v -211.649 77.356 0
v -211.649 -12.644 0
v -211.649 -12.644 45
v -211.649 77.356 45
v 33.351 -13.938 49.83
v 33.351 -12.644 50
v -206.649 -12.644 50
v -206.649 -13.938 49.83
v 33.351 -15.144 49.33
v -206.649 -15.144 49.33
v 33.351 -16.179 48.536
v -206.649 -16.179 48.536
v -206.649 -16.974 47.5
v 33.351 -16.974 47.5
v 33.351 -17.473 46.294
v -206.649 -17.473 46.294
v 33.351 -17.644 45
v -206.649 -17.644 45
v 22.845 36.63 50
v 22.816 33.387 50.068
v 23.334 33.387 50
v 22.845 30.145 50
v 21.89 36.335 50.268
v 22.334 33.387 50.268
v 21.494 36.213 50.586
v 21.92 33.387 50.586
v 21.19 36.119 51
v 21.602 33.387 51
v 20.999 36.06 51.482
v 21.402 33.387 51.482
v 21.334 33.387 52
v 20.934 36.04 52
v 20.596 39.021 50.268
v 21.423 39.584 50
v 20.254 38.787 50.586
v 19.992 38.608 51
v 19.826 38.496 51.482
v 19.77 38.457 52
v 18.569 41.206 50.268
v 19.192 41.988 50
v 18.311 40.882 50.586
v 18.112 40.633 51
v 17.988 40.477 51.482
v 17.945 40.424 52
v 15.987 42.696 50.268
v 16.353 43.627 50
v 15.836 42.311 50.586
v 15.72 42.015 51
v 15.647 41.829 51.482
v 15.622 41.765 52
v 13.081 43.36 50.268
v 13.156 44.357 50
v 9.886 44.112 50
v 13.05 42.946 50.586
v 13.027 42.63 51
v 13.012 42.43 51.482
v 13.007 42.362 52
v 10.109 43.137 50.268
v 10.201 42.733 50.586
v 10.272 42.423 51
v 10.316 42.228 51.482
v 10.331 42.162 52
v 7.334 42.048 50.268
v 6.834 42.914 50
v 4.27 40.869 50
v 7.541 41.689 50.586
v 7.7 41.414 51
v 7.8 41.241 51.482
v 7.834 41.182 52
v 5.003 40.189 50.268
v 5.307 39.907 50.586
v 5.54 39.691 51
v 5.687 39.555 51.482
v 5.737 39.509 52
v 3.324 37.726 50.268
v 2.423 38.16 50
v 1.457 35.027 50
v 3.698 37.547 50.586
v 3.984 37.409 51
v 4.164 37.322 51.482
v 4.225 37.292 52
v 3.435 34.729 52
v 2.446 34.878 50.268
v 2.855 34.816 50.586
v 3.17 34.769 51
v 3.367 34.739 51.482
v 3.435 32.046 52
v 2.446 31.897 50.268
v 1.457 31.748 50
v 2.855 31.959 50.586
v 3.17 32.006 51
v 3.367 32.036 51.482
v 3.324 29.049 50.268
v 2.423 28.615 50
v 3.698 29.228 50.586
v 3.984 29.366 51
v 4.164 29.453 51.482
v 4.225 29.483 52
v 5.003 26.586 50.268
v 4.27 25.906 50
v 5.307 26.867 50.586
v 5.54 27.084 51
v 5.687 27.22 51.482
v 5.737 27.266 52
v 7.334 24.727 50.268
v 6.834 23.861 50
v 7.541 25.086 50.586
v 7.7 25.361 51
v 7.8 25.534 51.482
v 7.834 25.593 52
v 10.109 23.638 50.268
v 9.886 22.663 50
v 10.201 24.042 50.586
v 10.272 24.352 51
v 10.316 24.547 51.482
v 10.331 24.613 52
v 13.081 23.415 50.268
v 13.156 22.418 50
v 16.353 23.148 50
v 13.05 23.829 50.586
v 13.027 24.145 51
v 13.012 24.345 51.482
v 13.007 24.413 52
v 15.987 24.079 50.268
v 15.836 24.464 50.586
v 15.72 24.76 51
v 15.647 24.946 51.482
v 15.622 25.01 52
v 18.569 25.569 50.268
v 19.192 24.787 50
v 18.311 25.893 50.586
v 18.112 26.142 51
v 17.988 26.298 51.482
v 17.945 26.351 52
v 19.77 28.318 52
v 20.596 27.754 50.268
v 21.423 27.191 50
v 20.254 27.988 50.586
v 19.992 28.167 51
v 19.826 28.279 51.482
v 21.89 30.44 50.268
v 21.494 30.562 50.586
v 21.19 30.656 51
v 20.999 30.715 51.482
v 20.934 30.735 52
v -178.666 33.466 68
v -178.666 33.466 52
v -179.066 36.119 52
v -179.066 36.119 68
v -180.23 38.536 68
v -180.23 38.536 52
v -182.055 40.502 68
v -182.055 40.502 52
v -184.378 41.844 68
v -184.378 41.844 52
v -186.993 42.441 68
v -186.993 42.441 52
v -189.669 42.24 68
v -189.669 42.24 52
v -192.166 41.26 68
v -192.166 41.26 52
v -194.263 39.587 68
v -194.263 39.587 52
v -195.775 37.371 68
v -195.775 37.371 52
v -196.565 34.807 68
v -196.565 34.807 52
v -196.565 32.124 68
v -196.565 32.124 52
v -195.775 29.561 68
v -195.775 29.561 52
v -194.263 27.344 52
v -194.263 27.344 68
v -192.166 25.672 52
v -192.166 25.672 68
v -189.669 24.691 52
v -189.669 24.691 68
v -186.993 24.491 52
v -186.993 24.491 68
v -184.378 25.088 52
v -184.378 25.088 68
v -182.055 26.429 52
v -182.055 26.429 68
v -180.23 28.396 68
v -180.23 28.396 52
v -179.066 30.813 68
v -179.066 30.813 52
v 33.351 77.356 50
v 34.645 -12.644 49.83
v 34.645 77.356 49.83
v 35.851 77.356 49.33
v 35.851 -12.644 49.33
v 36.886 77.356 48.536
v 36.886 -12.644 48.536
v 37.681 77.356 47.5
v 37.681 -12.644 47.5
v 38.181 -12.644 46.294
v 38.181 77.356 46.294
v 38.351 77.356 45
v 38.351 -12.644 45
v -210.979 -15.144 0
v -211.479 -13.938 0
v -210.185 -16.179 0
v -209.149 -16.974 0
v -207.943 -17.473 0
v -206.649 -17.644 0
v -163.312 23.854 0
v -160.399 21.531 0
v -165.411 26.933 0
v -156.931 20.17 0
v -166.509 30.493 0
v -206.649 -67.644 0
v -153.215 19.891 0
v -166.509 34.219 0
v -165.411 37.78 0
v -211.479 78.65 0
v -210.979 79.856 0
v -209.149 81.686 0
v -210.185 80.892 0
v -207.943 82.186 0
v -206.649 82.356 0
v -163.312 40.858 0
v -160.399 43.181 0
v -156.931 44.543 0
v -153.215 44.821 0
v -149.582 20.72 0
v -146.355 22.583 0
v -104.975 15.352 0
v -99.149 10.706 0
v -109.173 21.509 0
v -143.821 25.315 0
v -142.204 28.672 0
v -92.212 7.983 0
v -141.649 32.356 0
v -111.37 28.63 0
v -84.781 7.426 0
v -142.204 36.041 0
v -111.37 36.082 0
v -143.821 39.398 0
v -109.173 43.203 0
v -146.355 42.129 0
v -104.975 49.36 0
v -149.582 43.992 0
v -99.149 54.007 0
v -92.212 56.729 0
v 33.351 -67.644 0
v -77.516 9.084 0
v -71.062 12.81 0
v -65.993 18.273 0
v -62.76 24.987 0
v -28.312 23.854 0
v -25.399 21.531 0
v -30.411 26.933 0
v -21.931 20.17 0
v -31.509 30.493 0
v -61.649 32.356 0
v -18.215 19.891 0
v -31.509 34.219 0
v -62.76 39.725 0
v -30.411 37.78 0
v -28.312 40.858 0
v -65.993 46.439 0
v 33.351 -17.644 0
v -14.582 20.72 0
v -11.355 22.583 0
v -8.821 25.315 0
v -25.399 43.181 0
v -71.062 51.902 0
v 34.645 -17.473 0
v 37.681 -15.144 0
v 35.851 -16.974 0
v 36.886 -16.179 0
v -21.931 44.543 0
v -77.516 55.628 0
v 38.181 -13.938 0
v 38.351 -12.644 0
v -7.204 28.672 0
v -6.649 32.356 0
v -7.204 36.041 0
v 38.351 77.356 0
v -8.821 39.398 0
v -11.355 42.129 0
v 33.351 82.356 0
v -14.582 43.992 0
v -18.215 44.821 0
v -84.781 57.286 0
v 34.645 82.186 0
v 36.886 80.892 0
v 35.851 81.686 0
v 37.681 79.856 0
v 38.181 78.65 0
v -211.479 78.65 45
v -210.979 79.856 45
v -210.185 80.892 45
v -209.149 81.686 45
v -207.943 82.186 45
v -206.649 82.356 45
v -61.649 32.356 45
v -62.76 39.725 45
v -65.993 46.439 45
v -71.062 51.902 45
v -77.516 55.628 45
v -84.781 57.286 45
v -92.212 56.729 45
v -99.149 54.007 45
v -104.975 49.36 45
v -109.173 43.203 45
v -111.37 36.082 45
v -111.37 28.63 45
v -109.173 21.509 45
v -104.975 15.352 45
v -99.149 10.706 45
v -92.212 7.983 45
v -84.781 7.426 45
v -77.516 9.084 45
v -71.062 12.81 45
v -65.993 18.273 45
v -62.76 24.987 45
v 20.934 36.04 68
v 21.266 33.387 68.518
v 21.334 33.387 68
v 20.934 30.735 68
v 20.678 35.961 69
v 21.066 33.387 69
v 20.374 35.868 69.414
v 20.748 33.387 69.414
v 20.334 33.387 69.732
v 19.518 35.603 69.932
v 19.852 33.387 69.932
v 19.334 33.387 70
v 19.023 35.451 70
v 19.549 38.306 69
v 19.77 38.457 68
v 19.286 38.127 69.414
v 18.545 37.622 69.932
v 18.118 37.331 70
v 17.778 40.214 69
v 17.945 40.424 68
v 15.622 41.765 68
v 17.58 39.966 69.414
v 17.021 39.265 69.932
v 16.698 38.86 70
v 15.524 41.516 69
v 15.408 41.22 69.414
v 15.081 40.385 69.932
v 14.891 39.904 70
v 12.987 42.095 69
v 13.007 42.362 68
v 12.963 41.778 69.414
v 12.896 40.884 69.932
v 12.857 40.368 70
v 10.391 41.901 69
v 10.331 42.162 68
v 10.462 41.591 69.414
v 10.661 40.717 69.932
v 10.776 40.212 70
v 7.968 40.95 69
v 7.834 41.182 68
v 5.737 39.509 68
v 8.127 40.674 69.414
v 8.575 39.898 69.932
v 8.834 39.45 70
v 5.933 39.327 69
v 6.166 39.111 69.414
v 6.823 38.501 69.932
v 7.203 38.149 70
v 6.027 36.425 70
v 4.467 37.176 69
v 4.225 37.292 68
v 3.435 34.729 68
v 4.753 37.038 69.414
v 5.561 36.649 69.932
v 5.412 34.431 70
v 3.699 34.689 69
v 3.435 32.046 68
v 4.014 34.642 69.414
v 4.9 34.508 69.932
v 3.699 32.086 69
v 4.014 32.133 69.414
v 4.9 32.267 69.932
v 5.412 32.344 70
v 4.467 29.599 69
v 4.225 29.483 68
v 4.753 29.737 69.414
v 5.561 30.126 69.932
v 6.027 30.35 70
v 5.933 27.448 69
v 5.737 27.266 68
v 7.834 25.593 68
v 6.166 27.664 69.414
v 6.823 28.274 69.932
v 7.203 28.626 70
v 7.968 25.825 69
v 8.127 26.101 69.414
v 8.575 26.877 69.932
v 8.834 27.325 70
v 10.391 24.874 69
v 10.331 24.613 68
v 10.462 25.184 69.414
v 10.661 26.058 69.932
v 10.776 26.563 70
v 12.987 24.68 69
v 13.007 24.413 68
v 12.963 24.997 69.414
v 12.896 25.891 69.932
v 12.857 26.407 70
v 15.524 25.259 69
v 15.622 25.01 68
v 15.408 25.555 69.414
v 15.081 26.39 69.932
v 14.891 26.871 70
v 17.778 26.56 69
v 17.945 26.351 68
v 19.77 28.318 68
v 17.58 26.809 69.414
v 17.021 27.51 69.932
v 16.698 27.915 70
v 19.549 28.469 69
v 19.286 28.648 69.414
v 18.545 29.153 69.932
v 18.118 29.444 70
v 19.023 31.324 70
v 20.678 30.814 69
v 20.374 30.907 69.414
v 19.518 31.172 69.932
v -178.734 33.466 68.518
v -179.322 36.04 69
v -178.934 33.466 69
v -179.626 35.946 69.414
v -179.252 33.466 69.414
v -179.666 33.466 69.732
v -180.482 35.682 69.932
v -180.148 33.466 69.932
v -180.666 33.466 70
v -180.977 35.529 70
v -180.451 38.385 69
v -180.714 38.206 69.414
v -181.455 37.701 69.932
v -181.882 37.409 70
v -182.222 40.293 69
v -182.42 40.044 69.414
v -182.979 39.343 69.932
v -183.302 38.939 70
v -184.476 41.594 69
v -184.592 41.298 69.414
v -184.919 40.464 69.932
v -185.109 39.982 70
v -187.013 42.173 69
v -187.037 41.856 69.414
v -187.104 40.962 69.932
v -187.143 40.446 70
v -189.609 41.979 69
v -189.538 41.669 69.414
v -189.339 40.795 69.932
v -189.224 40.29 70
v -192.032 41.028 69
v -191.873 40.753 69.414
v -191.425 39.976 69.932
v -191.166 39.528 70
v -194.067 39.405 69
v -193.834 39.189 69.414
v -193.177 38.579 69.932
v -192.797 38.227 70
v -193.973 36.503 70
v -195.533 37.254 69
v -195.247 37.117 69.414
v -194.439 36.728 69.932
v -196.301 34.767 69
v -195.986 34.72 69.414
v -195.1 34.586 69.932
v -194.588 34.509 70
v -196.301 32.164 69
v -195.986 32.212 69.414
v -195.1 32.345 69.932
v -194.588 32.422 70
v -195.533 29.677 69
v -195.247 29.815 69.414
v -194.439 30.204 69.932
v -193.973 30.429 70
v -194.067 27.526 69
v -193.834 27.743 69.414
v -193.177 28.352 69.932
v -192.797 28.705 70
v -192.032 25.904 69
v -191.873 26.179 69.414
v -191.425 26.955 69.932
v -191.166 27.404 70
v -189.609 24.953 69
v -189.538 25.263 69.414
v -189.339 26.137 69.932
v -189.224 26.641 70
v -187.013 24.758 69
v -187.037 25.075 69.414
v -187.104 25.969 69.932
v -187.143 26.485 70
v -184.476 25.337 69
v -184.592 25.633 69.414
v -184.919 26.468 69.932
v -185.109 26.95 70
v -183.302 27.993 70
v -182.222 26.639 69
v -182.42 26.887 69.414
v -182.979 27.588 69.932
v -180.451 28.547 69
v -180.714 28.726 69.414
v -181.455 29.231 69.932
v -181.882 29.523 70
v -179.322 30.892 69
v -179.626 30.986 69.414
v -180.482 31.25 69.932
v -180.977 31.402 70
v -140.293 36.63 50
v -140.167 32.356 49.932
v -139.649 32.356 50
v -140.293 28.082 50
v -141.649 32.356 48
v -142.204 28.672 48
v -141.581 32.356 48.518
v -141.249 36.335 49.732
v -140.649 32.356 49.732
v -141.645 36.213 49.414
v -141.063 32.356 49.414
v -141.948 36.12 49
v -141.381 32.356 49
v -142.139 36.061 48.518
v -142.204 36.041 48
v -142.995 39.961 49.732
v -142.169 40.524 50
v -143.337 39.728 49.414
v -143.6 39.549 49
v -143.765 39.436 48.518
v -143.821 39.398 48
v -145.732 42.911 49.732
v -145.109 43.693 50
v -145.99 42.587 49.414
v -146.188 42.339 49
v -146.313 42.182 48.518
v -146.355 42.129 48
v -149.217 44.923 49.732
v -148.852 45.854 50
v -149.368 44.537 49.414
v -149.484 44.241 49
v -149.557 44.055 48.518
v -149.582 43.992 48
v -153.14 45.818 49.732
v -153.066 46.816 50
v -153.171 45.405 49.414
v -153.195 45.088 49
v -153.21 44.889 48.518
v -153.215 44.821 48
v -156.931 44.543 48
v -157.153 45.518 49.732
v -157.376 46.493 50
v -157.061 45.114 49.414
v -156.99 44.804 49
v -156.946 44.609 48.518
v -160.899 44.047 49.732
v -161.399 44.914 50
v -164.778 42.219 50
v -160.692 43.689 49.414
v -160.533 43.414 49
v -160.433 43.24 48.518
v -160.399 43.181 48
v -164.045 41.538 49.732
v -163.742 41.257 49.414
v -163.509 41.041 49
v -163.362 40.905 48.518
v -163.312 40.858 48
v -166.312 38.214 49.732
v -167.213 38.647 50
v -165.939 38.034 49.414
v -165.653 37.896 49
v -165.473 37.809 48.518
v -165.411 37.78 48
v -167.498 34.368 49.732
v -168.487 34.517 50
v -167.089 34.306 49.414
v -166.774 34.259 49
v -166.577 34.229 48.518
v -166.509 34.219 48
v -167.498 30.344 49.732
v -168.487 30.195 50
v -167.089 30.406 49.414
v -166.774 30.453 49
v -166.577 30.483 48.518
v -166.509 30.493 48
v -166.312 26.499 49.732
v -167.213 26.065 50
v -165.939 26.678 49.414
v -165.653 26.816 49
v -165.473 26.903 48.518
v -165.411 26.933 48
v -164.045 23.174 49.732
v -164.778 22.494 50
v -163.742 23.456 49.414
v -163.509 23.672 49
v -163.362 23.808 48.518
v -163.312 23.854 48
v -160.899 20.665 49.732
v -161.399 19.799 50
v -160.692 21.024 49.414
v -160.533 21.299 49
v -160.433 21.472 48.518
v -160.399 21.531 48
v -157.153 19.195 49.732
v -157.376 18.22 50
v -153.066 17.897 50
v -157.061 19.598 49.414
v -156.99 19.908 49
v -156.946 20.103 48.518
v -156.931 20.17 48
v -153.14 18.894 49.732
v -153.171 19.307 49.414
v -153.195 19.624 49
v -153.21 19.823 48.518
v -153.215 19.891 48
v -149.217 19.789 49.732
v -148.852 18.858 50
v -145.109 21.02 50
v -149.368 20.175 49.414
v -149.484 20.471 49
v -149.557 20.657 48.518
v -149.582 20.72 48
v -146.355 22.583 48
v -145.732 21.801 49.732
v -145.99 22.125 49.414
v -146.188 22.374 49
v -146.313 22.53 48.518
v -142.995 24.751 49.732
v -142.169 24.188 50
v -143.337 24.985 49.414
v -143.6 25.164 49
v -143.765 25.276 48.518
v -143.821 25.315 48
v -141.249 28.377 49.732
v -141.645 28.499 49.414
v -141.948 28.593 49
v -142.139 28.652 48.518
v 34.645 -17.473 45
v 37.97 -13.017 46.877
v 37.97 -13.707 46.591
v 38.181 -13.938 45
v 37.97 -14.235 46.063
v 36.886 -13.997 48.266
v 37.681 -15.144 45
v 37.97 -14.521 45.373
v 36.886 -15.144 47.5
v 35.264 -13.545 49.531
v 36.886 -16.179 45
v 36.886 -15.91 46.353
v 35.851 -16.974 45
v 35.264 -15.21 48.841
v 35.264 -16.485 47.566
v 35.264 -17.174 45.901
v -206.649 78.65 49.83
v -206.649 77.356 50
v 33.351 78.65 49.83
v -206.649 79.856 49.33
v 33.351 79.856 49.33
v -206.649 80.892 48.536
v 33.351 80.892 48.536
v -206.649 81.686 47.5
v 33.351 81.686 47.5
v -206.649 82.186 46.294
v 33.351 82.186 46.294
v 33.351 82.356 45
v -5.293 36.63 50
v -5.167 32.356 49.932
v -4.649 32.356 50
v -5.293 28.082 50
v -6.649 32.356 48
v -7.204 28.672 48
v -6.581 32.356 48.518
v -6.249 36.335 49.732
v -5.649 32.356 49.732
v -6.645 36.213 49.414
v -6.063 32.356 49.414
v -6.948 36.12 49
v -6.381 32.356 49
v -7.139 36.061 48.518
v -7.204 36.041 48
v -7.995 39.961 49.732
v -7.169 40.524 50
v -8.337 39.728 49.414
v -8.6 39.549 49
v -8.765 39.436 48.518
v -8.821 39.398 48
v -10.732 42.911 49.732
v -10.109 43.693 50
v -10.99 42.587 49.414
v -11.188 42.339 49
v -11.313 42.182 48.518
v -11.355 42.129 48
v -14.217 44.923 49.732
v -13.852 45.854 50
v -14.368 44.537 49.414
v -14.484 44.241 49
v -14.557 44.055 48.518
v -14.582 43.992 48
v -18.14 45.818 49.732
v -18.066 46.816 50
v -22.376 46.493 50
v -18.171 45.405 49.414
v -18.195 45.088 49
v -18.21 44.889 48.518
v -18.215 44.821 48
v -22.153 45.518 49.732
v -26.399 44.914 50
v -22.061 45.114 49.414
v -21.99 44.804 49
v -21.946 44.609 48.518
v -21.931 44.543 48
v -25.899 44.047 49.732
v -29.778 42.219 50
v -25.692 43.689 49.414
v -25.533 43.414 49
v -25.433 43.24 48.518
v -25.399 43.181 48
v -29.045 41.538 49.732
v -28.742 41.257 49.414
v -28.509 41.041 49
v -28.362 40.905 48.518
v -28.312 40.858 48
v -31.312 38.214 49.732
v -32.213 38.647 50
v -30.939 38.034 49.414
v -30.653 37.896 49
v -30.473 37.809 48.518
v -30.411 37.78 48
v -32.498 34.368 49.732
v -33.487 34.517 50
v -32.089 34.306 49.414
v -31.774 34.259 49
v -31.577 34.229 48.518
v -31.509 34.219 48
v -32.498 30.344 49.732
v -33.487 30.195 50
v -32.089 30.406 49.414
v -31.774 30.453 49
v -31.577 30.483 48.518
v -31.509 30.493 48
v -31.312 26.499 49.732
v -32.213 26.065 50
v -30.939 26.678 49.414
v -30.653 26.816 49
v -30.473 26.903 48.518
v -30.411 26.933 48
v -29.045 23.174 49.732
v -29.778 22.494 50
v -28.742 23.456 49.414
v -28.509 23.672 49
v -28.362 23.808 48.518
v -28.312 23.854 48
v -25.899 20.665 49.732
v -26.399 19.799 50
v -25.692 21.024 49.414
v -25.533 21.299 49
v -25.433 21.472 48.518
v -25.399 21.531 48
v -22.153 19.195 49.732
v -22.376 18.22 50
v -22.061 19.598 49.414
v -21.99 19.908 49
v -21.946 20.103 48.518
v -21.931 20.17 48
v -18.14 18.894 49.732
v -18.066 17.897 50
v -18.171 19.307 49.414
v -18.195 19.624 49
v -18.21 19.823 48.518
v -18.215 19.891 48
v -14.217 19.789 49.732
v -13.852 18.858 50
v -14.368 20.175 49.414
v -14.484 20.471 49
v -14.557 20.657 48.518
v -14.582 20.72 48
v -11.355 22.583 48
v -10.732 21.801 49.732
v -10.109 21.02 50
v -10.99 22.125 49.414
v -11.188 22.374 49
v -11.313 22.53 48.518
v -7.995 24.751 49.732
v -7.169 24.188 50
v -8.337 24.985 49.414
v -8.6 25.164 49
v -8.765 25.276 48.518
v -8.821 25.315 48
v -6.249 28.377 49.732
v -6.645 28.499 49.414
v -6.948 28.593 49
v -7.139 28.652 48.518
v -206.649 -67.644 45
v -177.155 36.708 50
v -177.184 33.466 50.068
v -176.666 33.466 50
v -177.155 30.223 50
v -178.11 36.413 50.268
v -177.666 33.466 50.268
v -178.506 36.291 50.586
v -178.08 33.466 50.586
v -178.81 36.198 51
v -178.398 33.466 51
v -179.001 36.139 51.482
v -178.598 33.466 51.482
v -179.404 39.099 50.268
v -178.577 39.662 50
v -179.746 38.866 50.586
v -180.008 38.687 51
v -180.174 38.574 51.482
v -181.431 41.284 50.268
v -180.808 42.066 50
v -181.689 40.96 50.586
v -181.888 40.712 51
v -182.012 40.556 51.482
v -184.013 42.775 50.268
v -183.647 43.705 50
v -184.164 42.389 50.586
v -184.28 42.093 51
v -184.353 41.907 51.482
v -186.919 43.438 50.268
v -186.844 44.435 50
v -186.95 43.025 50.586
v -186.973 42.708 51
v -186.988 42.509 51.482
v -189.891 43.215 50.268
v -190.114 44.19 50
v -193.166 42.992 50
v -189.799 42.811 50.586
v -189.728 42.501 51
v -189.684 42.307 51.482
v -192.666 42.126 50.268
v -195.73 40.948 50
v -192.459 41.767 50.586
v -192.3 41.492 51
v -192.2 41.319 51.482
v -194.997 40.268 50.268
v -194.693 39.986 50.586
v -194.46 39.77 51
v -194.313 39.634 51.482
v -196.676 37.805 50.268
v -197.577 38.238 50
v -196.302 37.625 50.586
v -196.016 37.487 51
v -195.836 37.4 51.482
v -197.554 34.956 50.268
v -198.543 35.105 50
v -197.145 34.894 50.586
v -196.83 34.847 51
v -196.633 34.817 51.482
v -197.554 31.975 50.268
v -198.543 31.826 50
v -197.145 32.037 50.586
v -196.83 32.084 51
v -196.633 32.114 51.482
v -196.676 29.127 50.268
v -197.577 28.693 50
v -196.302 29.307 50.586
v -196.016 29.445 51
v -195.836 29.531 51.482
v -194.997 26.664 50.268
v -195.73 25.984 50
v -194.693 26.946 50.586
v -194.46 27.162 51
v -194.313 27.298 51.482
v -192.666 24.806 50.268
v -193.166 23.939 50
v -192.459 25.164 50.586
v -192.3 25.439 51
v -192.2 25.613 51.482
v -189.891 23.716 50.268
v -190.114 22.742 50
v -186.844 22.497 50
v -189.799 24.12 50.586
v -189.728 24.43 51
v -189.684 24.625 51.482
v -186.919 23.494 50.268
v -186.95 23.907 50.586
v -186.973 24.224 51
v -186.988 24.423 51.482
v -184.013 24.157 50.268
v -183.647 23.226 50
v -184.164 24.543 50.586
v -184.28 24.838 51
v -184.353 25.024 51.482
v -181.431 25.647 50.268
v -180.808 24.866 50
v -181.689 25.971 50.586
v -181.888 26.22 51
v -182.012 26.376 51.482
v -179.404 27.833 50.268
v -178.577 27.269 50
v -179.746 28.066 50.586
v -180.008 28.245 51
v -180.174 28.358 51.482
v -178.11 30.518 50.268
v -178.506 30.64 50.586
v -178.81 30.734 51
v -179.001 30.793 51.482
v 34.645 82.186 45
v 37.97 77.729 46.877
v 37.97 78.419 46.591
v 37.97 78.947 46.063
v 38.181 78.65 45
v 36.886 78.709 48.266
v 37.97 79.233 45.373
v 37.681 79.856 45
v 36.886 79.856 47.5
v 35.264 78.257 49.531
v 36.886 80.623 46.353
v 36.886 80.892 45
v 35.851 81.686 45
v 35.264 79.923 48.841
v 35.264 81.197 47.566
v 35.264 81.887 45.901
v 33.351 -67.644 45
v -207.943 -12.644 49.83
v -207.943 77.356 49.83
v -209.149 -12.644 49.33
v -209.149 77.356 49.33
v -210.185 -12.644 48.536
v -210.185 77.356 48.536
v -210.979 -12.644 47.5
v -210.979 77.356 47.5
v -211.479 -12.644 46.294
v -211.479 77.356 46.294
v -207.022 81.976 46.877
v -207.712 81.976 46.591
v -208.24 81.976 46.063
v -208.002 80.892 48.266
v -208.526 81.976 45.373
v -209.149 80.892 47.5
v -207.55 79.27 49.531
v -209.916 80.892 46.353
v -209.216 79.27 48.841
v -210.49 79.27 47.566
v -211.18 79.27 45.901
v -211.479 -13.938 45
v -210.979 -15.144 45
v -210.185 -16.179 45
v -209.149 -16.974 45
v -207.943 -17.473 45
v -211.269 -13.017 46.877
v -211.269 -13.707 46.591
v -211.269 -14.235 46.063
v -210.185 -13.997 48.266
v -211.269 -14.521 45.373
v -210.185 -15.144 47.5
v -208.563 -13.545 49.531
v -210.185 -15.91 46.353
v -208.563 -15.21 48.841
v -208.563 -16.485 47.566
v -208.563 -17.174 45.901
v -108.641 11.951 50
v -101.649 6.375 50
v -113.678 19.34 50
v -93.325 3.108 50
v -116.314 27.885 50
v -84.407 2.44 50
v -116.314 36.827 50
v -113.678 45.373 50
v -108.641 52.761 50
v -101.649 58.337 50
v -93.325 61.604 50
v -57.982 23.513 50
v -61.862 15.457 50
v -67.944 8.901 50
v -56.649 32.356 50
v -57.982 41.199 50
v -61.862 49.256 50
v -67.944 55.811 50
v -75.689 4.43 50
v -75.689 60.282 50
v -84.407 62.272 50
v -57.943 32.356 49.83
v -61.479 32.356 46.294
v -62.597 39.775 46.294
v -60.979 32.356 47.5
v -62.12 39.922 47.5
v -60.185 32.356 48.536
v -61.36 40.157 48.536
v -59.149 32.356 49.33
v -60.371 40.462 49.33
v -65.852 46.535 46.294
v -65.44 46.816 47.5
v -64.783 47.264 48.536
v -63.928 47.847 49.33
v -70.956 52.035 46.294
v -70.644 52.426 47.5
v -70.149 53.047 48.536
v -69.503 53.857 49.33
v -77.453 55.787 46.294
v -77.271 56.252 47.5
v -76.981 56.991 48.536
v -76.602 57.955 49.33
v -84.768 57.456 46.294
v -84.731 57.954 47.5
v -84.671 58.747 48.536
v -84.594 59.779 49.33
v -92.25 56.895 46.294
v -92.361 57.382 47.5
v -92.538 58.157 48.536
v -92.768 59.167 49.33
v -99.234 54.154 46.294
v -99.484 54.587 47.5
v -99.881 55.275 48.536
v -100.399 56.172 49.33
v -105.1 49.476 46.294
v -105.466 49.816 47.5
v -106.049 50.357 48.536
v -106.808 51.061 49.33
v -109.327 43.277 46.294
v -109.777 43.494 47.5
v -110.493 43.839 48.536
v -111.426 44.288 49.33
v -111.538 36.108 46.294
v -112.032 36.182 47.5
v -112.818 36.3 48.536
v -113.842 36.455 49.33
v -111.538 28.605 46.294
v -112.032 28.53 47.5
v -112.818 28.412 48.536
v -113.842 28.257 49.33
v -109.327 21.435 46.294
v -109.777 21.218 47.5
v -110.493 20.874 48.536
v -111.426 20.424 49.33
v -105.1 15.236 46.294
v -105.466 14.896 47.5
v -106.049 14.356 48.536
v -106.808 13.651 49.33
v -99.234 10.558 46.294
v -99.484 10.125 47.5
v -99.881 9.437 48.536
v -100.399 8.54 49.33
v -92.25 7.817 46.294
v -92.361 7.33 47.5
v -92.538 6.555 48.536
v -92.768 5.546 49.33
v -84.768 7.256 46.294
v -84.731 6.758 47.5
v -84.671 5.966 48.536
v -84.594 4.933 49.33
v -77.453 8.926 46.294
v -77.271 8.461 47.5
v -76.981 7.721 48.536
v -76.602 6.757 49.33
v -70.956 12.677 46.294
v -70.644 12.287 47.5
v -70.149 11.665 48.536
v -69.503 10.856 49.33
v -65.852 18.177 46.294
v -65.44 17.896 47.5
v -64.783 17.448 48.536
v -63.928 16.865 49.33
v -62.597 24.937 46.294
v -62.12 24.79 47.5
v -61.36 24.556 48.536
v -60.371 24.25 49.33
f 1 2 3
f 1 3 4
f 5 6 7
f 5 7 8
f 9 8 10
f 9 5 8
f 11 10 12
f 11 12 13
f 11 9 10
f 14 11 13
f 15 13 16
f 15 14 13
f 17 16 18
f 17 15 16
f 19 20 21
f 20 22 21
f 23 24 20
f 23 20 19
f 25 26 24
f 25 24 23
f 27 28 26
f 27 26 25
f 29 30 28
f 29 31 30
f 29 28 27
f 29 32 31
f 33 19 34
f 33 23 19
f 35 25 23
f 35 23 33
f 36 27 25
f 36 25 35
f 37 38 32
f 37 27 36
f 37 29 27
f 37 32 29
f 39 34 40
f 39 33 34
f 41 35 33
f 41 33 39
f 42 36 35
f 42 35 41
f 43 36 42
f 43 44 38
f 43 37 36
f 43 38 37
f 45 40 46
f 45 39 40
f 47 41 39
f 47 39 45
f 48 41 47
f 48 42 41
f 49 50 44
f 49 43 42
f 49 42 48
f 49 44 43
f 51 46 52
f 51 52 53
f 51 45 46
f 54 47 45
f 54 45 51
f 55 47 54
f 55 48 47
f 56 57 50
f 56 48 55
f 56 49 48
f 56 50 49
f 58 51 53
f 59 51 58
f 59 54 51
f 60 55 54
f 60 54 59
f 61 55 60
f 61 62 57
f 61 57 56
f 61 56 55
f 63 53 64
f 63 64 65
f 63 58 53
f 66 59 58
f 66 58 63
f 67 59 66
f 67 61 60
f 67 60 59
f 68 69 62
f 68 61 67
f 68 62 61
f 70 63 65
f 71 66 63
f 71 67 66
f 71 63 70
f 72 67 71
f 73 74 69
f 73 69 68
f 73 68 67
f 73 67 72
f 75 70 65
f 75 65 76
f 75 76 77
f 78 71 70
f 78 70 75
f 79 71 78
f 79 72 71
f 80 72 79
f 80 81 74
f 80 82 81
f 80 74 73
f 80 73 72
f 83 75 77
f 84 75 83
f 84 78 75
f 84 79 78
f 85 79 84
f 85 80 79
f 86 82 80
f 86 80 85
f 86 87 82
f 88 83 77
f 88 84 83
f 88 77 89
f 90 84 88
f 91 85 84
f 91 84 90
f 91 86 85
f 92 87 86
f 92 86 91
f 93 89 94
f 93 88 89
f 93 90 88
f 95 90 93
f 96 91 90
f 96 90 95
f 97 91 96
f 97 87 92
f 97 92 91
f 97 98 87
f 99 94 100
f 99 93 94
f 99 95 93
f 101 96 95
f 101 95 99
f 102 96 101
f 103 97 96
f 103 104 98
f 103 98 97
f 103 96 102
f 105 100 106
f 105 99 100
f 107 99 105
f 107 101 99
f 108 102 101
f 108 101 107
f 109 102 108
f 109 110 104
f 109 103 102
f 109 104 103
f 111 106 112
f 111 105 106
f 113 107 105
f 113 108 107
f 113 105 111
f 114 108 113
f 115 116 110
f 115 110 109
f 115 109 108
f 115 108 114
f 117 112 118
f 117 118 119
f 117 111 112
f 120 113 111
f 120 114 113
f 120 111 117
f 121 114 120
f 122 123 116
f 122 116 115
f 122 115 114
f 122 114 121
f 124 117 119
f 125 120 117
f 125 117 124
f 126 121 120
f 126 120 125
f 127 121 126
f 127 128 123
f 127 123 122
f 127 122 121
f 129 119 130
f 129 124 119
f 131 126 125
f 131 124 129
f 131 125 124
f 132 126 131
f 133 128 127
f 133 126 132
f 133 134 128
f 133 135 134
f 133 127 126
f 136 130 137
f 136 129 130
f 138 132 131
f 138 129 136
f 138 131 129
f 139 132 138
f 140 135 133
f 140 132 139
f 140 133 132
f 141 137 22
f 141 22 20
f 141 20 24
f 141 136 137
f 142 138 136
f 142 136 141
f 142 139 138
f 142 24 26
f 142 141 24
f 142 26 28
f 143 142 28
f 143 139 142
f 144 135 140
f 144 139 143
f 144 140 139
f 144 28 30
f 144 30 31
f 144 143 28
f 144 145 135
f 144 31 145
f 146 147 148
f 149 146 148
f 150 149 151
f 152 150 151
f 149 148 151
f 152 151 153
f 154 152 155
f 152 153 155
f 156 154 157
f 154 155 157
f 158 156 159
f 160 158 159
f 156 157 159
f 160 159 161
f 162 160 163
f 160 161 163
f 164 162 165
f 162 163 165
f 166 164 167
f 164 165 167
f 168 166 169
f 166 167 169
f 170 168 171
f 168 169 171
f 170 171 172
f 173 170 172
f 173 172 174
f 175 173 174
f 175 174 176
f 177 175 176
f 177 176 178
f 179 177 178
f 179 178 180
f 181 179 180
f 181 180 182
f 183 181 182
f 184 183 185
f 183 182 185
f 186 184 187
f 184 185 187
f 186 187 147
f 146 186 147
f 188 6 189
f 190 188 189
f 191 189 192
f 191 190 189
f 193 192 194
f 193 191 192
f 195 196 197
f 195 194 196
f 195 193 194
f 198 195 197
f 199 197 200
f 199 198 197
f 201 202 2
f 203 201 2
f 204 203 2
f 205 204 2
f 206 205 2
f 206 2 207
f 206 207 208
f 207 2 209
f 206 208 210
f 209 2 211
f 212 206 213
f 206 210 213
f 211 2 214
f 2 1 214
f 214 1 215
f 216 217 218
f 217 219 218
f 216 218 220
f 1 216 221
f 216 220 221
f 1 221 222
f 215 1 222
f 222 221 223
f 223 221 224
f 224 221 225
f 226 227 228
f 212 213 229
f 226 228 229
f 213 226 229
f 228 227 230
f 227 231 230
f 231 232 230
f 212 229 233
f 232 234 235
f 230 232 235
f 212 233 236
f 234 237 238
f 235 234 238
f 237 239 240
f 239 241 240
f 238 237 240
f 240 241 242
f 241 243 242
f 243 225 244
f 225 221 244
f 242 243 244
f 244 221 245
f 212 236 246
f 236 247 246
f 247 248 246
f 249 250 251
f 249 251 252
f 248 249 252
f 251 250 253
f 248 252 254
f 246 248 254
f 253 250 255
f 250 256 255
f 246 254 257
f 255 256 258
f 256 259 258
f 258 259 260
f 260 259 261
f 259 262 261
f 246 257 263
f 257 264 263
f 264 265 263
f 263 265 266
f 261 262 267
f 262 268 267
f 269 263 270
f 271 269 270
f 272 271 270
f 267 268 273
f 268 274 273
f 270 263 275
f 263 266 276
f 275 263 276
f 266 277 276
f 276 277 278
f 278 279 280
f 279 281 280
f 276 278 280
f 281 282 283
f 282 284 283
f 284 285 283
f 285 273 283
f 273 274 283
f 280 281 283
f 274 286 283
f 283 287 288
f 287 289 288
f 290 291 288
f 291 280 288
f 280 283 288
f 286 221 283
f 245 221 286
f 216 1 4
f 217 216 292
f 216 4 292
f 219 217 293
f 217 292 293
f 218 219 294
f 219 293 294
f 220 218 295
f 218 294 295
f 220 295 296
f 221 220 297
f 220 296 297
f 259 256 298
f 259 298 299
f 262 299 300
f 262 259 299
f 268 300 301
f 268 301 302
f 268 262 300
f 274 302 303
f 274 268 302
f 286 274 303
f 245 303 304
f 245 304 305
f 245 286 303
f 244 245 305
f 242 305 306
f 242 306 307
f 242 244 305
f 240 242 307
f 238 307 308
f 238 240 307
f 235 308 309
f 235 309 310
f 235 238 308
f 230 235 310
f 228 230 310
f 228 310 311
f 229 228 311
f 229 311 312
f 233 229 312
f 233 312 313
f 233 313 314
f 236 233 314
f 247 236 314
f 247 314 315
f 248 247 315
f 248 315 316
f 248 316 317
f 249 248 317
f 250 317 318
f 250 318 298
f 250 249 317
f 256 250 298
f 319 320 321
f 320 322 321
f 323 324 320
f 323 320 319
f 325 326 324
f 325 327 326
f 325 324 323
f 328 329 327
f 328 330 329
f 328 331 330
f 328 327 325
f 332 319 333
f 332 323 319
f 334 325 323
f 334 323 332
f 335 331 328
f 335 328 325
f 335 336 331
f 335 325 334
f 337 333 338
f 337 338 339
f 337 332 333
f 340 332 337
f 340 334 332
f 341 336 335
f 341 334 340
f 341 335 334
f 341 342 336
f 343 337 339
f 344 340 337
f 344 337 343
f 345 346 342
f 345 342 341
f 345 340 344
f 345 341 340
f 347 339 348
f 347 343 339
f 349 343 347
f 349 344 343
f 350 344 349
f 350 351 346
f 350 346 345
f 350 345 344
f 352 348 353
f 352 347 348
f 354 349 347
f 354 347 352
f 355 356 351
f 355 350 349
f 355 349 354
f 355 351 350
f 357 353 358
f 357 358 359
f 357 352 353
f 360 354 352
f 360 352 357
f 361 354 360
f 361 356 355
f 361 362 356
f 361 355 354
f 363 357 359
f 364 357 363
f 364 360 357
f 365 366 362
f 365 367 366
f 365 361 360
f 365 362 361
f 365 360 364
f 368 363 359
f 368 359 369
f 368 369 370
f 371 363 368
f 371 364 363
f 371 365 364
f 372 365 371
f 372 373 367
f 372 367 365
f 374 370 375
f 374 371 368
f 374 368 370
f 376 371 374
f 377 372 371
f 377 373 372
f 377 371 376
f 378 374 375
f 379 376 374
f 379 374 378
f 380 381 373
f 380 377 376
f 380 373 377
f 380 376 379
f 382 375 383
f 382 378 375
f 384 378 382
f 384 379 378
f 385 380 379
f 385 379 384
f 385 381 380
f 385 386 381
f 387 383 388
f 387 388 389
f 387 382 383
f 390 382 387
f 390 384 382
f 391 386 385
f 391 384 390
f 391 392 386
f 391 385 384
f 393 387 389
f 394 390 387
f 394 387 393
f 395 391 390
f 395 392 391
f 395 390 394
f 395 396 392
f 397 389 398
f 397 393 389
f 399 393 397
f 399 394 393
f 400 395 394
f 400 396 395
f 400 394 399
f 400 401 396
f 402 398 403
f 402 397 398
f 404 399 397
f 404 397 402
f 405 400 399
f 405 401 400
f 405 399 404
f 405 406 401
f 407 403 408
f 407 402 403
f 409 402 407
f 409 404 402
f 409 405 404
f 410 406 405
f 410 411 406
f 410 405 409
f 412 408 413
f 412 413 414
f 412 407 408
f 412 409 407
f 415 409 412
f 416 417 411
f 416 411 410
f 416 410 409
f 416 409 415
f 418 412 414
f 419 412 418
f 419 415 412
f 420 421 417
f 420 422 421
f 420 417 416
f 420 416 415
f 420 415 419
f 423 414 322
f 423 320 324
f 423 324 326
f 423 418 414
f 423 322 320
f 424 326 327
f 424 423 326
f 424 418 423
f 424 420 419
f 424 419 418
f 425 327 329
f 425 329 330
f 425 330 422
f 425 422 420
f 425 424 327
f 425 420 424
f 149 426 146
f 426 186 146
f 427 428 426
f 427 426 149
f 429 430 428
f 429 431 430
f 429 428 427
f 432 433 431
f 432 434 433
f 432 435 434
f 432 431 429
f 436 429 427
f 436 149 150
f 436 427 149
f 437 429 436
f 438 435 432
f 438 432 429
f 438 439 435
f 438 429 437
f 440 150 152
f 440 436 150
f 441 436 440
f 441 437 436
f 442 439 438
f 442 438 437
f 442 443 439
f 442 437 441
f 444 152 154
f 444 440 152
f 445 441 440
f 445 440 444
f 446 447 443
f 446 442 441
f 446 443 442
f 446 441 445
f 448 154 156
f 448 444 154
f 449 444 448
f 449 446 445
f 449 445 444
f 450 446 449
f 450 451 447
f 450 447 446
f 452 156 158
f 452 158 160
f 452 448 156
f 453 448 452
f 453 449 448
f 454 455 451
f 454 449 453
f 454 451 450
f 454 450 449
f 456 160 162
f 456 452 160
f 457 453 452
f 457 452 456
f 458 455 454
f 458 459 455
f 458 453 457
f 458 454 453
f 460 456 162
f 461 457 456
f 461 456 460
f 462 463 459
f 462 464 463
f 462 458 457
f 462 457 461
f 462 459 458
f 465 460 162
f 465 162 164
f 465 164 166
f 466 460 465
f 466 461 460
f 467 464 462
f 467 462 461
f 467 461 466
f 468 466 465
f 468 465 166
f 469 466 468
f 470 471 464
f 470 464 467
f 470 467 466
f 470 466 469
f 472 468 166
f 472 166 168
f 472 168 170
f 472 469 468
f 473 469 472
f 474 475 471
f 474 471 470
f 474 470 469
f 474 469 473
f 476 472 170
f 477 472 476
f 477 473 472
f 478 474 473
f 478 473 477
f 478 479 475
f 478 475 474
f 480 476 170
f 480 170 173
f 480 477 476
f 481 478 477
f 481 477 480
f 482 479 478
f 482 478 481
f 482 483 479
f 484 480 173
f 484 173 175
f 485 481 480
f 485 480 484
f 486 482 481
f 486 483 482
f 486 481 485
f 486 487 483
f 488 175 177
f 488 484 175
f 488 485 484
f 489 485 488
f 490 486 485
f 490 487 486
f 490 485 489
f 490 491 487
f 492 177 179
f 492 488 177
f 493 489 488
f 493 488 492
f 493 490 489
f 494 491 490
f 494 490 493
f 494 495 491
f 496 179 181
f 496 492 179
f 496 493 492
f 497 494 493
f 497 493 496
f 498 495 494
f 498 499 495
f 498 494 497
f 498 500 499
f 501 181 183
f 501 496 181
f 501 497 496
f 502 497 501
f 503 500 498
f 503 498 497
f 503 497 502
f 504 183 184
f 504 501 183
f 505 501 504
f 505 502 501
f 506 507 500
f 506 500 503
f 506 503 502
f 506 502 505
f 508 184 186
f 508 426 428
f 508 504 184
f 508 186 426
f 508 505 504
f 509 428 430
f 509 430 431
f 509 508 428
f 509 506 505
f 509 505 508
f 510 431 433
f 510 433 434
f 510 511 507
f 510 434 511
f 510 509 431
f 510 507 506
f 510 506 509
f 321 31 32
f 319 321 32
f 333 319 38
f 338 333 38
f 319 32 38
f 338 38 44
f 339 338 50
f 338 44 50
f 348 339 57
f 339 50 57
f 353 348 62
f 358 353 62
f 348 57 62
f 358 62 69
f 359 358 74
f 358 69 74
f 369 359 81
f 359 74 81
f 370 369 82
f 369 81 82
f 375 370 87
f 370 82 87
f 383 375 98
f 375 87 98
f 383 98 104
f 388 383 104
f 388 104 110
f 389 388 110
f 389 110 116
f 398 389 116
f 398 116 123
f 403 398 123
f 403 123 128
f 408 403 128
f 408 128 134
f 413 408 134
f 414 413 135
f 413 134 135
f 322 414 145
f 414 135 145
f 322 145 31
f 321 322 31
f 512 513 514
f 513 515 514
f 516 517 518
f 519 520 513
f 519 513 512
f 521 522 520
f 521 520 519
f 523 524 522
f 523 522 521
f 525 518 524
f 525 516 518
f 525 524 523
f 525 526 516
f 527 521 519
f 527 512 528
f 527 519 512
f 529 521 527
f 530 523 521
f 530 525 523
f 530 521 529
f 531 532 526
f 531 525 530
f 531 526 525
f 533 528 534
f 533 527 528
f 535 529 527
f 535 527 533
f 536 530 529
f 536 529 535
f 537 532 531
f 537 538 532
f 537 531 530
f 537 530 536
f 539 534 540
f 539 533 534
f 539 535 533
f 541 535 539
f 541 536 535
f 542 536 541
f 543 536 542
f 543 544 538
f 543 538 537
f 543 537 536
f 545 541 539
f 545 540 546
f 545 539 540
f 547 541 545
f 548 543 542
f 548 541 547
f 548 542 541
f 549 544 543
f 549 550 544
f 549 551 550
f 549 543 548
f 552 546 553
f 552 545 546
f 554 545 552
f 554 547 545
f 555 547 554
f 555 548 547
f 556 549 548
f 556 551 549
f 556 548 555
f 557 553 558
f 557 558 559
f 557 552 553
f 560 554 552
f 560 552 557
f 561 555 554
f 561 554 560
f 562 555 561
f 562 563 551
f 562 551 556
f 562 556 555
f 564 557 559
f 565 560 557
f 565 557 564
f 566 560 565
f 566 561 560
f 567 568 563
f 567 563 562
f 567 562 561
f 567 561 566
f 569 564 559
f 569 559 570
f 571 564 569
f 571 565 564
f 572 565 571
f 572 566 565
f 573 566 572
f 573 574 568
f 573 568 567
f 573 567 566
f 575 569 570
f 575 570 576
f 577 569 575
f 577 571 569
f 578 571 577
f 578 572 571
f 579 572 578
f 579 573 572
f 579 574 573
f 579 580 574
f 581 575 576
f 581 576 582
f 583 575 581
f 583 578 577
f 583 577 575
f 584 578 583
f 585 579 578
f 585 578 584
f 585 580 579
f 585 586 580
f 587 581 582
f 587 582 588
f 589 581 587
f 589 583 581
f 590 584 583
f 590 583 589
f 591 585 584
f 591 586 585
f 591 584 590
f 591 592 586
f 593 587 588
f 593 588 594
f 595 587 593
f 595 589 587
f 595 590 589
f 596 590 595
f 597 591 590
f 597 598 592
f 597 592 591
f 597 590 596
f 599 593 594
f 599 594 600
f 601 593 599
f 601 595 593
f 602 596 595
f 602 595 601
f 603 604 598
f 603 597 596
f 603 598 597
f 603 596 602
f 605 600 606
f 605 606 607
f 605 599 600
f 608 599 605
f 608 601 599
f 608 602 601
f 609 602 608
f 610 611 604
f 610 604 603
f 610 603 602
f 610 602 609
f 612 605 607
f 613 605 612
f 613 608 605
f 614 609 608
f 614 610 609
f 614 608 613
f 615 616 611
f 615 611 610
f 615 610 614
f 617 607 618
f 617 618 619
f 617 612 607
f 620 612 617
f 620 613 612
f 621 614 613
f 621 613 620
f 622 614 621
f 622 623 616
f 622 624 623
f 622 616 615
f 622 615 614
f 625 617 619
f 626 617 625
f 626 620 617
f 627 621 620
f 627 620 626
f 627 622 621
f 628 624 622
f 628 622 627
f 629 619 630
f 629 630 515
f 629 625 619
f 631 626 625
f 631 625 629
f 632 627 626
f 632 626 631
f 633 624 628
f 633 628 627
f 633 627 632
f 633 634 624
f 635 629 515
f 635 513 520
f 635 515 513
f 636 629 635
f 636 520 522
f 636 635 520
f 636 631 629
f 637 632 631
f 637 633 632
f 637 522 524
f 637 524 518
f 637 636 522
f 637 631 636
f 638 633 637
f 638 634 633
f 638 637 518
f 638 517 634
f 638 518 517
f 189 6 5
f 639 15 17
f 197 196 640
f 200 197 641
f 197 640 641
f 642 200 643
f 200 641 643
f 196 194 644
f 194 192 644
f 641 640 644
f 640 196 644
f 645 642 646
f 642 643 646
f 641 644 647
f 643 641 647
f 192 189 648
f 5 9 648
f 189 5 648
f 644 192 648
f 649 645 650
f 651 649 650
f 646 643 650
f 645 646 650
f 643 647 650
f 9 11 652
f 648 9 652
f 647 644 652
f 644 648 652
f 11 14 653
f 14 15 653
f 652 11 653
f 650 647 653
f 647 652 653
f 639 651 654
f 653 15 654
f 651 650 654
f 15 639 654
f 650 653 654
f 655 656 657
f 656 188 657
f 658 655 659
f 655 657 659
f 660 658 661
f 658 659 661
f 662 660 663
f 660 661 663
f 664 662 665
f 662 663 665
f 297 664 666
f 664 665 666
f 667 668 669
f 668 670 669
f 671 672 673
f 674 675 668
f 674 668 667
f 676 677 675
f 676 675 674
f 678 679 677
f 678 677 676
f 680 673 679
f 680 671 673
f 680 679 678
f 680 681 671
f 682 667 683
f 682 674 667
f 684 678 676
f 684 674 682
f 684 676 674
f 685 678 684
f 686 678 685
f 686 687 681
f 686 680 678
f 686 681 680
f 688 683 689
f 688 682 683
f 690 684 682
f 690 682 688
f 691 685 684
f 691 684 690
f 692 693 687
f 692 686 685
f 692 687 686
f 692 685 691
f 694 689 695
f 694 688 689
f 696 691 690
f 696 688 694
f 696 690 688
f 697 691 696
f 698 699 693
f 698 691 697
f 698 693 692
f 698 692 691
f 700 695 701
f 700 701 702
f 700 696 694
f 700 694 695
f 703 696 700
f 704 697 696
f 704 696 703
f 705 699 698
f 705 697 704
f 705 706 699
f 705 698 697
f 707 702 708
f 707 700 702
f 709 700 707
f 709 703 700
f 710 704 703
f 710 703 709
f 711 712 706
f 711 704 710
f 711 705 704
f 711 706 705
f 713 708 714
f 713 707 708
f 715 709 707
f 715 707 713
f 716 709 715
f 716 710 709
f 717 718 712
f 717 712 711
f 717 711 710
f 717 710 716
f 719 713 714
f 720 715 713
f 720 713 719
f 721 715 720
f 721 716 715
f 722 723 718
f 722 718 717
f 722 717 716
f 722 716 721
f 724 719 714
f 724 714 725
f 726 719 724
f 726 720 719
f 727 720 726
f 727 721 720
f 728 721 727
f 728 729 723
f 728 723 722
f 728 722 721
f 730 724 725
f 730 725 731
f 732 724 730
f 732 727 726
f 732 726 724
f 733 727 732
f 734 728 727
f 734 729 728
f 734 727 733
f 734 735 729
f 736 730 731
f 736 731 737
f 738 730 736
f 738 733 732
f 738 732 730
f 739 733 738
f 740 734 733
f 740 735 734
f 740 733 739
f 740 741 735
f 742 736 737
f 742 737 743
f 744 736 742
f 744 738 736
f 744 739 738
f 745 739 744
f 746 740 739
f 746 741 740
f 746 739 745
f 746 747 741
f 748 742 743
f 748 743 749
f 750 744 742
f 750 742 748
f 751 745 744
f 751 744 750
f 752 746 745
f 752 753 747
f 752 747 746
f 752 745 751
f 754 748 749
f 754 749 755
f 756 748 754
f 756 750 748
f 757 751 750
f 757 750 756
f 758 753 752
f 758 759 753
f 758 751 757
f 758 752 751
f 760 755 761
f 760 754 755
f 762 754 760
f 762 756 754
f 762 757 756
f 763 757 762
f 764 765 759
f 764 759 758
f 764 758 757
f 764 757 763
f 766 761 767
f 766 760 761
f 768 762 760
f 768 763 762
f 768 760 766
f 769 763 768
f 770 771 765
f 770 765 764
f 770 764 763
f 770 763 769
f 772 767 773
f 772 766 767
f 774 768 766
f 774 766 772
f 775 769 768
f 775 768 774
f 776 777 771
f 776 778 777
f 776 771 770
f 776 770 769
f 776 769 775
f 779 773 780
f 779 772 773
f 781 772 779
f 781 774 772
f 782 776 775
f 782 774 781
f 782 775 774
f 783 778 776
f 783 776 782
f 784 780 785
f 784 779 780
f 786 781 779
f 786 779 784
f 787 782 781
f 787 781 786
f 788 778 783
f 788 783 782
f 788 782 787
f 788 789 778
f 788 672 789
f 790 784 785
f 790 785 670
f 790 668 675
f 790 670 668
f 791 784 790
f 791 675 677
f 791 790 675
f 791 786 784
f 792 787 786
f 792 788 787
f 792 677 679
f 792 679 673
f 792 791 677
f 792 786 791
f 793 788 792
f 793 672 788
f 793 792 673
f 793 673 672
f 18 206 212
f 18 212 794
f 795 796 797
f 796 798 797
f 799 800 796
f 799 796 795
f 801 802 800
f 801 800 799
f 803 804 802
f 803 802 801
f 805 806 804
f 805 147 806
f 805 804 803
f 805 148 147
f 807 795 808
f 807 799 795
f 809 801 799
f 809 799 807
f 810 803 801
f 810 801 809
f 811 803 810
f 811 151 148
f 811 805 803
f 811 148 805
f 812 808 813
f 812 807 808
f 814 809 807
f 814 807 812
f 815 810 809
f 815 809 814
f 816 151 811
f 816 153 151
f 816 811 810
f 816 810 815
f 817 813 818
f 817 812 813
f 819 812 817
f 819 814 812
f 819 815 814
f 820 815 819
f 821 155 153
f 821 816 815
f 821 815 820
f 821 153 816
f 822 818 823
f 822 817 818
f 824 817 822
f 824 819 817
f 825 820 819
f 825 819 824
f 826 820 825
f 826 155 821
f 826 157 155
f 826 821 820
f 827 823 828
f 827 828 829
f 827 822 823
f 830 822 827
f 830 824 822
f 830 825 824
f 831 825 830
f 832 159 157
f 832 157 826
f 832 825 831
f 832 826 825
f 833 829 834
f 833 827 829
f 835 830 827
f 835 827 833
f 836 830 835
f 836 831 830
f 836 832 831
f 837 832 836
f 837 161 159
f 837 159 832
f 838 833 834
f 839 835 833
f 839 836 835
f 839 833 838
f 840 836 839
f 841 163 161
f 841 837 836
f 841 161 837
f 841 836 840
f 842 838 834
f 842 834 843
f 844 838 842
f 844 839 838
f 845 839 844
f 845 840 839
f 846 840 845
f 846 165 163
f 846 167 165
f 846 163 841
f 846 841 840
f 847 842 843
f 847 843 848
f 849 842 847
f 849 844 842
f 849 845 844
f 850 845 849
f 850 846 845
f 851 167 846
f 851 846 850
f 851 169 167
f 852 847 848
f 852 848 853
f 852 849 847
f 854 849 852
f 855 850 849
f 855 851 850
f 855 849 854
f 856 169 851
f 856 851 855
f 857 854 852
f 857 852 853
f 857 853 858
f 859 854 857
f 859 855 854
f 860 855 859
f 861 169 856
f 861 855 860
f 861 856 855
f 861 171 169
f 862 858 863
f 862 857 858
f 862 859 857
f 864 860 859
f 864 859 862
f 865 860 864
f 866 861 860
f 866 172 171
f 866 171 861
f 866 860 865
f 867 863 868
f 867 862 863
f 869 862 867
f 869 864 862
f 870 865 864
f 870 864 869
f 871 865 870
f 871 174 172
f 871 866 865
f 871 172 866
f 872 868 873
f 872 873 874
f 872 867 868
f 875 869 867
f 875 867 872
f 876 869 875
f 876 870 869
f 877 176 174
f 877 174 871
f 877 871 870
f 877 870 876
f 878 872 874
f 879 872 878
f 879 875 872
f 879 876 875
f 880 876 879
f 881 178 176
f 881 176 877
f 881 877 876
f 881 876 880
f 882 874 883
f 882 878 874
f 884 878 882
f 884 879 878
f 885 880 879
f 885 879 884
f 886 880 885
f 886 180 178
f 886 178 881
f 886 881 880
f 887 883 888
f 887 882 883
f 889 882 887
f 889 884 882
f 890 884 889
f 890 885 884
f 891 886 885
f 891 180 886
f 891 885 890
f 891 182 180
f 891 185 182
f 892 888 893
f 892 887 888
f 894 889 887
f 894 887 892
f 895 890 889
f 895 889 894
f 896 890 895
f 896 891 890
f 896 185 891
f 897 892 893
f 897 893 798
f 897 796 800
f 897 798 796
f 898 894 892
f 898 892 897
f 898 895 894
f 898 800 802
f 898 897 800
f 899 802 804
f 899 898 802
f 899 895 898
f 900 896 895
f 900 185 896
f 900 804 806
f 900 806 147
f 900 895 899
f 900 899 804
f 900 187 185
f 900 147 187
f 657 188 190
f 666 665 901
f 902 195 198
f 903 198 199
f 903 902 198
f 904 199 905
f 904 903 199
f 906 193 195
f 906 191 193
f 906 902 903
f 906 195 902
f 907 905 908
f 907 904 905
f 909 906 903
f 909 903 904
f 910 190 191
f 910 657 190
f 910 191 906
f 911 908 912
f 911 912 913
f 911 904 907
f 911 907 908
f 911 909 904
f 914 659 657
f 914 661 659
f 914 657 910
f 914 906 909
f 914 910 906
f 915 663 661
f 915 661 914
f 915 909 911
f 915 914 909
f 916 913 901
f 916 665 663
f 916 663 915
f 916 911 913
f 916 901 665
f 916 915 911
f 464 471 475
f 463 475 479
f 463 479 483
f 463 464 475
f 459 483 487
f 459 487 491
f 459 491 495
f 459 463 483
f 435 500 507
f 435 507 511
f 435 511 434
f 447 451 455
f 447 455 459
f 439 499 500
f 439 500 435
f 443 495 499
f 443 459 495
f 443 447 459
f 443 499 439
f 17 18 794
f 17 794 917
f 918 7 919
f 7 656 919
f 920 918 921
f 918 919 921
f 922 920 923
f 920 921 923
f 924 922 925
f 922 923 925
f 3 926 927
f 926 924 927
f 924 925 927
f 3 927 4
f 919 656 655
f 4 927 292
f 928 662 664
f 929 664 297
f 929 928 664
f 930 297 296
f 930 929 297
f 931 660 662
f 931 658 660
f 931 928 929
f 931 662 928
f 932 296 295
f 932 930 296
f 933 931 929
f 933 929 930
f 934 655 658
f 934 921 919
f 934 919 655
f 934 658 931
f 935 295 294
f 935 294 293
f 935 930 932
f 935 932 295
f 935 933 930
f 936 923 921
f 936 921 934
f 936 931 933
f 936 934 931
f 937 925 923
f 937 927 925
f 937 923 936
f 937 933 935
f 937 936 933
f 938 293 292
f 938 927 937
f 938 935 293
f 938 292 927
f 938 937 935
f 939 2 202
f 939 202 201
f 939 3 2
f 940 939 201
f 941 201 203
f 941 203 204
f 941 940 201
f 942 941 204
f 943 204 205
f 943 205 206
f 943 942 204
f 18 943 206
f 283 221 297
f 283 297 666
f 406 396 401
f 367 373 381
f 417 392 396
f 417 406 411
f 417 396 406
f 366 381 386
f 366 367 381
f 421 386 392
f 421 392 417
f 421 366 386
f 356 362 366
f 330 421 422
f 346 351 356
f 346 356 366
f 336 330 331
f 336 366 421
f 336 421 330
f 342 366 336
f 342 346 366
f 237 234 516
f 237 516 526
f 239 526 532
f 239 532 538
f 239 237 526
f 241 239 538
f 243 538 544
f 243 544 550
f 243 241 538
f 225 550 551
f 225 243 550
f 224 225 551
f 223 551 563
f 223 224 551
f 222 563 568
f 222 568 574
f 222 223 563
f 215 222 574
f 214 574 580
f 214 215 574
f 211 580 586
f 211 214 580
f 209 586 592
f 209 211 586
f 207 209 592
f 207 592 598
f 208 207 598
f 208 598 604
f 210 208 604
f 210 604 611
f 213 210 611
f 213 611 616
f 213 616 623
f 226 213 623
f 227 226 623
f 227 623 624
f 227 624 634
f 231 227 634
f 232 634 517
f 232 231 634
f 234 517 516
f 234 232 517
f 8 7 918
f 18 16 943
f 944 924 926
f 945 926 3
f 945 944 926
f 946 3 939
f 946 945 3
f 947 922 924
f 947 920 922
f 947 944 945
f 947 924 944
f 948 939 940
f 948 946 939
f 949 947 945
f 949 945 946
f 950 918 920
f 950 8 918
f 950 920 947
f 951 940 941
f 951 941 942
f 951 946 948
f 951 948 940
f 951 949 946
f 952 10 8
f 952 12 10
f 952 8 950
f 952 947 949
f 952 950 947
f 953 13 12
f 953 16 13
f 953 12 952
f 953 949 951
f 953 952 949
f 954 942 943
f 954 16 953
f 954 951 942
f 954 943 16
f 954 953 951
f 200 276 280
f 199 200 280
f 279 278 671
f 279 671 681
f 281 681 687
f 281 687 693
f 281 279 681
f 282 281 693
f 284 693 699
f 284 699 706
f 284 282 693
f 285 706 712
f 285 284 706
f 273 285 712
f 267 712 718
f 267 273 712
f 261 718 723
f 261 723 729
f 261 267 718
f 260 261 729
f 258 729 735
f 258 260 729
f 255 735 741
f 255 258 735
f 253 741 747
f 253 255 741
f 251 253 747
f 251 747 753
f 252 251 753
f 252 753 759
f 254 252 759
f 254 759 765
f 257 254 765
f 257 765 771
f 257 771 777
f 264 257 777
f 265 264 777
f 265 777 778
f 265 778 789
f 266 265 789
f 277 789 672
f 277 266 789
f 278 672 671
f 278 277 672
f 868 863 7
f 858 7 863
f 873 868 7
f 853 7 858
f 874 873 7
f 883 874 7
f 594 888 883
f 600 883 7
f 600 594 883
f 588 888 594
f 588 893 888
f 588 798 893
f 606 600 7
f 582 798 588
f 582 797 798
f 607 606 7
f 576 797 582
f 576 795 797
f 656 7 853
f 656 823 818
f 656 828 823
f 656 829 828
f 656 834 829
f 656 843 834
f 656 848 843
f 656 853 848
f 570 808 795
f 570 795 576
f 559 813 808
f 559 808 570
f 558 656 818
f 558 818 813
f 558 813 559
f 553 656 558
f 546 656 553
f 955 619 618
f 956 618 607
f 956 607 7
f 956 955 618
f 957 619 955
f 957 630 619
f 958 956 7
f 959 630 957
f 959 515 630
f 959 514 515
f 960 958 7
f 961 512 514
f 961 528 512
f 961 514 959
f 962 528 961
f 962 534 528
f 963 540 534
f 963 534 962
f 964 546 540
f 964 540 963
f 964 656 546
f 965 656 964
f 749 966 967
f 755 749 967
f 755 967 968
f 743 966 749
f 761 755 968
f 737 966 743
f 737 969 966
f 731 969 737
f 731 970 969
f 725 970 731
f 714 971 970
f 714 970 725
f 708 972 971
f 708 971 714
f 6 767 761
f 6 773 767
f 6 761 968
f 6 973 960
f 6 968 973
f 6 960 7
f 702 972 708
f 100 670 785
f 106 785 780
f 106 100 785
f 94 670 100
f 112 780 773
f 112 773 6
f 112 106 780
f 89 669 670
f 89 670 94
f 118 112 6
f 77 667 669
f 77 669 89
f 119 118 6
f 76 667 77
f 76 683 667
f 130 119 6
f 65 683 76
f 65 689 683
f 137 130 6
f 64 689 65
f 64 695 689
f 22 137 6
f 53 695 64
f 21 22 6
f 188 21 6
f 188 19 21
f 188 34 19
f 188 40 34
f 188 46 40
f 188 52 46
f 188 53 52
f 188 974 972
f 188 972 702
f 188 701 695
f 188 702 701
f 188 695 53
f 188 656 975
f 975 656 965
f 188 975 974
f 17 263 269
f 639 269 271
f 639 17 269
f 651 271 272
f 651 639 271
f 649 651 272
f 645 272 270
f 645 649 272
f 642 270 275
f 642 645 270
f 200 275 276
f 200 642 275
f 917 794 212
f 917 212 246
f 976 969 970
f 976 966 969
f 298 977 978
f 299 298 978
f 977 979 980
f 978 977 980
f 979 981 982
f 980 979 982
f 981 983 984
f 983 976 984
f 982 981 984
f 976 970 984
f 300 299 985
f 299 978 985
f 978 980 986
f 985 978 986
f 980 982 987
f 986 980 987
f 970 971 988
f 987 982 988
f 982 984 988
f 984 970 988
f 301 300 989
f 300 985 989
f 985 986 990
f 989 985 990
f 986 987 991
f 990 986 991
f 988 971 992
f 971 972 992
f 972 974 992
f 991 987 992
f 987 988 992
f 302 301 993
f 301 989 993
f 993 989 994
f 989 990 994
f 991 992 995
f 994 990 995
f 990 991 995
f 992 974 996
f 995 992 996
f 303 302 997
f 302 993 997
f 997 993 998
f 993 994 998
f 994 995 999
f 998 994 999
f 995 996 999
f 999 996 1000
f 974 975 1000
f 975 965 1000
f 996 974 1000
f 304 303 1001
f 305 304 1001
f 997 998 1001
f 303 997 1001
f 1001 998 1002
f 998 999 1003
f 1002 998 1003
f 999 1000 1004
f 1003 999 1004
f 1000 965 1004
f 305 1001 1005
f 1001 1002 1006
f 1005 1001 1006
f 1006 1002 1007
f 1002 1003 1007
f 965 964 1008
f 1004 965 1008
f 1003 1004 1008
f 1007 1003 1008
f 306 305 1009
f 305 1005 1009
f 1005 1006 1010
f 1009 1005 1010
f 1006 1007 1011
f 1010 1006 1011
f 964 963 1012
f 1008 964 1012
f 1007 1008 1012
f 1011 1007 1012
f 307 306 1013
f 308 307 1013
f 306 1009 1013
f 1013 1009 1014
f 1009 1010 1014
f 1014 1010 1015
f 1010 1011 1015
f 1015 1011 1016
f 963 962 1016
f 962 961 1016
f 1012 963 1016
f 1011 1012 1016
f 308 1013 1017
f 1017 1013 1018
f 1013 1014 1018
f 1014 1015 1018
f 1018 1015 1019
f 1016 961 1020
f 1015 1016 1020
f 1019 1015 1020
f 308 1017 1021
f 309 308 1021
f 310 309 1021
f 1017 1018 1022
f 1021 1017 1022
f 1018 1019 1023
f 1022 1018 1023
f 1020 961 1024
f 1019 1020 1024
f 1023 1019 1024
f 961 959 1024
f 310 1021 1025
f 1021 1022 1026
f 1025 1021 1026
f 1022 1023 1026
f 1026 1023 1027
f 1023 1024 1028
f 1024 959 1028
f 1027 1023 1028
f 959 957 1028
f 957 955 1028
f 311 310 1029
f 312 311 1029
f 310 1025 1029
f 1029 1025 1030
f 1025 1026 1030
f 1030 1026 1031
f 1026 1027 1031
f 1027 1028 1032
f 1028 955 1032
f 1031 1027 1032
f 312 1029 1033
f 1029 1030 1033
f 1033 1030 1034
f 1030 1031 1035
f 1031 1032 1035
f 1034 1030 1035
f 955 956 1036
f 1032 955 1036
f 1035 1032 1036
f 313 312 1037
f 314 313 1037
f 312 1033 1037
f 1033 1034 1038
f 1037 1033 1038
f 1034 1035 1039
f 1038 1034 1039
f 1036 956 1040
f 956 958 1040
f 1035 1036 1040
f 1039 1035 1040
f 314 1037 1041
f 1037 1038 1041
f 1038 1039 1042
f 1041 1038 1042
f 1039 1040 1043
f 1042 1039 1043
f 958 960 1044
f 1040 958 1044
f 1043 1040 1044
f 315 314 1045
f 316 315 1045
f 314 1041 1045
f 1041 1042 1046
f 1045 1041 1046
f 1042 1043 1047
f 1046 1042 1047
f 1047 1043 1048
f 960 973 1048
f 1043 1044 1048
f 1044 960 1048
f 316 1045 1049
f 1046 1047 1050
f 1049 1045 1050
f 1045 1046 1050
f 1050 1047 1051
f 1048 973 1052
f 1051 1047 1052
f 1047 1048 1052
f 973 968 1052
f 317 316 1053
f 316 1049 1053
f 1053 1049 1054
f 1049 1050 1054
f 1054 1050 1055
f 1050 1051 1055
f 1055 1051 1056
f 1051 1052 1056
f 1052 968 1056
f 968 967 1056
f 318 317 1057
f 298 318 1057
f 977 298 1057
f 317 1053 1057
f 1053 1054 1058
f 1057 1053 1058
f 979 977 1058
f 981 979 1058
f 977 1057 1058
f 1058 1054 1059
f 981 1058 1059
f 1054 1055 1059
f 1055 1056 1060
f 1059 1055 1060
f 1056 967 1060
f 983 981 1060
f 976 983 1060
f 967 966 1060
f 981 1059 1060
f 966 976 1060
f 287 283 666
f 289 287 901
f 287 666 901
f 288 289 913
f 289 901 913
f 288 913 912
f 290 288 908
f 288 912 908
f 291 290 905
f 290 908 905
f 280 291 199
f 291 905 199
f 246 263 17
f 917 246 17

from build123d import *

# Parameters (mm, degrees)
F0_W      = 250
F0_H      = 100
F0_R      = 12.5
F0_R_2    = 25
F1_DEPTH  = 50
F2_R      = 5
F3_R      = 5
F4_R      = 9
F5_DEPTH  = 20
F6_R      = 2
F7_R      = 2
F1_FACE_W = 240
F1_FACE_H = 45
F8_DEPTH  = 50


with BuildPart() as f1:
    # F0 (on Top) → F1 (new body)
    with BuildSketch(Plane.XY):
        with Locations((-86.649109, 32.35614)):
            Rectangle(F0_W, F0_H)
        with Locations((-154.149109, 32.35614)):
            Circle(F0_R, mode=Mode.SUBTRACT)
        with Locations((-19.149109, 32.35614)):
            Circle(F0_R, mode=Mode.SUBTRACT)
        with Locations((-86.649109, 32.35614)):
            Circle(F0_R_2, mode=Mode.SUBTRACT)
    extrude(amount=F1_DEPTH)

    # F2
    f2_edges = [f1.edges().sort_by_distance(p)[0] for p in [
        (-111.649109, 32.35614, 50),
    ]]
    fillet(f2_edges, radius=F2_R)

    # F3
    f3_edges = [f1.edges().sort_by_distance(p)[0] for p in [
        (-86.649109, -17.64386, 50),
        (-211.649109, 32.35614, 50),
        (-86.649109, 82.35614, 50),
        (38.350891, 32.35614, 50),
        (38.350891, -17.64386, 25),
        (38.350891, 82.35614, 25),
        (-211.649109, -17.64386, 25),
        (-211.649109, 82.35614, 25),
    ]]
    fillet(f3_edges, radius=F3_R)

    # F4 (on face) → F5 (join)
    with BuildSketch(Plane.XY.offset(50)):
        with Locations((-187.665997, 33.465776)):
            Circle(F4_R)
        with Locations((12.334003, 33.387488)):
            Circle(F4_R)
    extrude(amount=F5_DEPTH)

    # F6
    f6_edges = [f1.edges().sort_by_distance(p)[0] for p in [
        (-196.665997, 33.465776, 70),
        (3.334003, 33.387488, 70),
        (3.334003, 33.387488, 50),
        (-196.665997, 33.465776, 50),
    ]]
    fillet(f6_edges, radius=F6_R)

    # F7
    f7_edges = [f1.edges().sort_by_distance(p)[0] for p in [
        (-166.649109, 32.35614, 50),
        (-31.649109, 32.35614, 50),
    ]]
    fillet(f7_edges, radius=F7_R)

    # F1_face (on face) → F8 (join)
    with BuildSketch(Plane(origin=(-86.649109, -17.64386, 22.5), x_dir=(1, 0, 0), z_dir=(0, -1, 0))):
        Rectangle(F1_FACE_W, F1_FACE_H)
    extrude(amount=F8_DEPTH)


solid = f1.part
